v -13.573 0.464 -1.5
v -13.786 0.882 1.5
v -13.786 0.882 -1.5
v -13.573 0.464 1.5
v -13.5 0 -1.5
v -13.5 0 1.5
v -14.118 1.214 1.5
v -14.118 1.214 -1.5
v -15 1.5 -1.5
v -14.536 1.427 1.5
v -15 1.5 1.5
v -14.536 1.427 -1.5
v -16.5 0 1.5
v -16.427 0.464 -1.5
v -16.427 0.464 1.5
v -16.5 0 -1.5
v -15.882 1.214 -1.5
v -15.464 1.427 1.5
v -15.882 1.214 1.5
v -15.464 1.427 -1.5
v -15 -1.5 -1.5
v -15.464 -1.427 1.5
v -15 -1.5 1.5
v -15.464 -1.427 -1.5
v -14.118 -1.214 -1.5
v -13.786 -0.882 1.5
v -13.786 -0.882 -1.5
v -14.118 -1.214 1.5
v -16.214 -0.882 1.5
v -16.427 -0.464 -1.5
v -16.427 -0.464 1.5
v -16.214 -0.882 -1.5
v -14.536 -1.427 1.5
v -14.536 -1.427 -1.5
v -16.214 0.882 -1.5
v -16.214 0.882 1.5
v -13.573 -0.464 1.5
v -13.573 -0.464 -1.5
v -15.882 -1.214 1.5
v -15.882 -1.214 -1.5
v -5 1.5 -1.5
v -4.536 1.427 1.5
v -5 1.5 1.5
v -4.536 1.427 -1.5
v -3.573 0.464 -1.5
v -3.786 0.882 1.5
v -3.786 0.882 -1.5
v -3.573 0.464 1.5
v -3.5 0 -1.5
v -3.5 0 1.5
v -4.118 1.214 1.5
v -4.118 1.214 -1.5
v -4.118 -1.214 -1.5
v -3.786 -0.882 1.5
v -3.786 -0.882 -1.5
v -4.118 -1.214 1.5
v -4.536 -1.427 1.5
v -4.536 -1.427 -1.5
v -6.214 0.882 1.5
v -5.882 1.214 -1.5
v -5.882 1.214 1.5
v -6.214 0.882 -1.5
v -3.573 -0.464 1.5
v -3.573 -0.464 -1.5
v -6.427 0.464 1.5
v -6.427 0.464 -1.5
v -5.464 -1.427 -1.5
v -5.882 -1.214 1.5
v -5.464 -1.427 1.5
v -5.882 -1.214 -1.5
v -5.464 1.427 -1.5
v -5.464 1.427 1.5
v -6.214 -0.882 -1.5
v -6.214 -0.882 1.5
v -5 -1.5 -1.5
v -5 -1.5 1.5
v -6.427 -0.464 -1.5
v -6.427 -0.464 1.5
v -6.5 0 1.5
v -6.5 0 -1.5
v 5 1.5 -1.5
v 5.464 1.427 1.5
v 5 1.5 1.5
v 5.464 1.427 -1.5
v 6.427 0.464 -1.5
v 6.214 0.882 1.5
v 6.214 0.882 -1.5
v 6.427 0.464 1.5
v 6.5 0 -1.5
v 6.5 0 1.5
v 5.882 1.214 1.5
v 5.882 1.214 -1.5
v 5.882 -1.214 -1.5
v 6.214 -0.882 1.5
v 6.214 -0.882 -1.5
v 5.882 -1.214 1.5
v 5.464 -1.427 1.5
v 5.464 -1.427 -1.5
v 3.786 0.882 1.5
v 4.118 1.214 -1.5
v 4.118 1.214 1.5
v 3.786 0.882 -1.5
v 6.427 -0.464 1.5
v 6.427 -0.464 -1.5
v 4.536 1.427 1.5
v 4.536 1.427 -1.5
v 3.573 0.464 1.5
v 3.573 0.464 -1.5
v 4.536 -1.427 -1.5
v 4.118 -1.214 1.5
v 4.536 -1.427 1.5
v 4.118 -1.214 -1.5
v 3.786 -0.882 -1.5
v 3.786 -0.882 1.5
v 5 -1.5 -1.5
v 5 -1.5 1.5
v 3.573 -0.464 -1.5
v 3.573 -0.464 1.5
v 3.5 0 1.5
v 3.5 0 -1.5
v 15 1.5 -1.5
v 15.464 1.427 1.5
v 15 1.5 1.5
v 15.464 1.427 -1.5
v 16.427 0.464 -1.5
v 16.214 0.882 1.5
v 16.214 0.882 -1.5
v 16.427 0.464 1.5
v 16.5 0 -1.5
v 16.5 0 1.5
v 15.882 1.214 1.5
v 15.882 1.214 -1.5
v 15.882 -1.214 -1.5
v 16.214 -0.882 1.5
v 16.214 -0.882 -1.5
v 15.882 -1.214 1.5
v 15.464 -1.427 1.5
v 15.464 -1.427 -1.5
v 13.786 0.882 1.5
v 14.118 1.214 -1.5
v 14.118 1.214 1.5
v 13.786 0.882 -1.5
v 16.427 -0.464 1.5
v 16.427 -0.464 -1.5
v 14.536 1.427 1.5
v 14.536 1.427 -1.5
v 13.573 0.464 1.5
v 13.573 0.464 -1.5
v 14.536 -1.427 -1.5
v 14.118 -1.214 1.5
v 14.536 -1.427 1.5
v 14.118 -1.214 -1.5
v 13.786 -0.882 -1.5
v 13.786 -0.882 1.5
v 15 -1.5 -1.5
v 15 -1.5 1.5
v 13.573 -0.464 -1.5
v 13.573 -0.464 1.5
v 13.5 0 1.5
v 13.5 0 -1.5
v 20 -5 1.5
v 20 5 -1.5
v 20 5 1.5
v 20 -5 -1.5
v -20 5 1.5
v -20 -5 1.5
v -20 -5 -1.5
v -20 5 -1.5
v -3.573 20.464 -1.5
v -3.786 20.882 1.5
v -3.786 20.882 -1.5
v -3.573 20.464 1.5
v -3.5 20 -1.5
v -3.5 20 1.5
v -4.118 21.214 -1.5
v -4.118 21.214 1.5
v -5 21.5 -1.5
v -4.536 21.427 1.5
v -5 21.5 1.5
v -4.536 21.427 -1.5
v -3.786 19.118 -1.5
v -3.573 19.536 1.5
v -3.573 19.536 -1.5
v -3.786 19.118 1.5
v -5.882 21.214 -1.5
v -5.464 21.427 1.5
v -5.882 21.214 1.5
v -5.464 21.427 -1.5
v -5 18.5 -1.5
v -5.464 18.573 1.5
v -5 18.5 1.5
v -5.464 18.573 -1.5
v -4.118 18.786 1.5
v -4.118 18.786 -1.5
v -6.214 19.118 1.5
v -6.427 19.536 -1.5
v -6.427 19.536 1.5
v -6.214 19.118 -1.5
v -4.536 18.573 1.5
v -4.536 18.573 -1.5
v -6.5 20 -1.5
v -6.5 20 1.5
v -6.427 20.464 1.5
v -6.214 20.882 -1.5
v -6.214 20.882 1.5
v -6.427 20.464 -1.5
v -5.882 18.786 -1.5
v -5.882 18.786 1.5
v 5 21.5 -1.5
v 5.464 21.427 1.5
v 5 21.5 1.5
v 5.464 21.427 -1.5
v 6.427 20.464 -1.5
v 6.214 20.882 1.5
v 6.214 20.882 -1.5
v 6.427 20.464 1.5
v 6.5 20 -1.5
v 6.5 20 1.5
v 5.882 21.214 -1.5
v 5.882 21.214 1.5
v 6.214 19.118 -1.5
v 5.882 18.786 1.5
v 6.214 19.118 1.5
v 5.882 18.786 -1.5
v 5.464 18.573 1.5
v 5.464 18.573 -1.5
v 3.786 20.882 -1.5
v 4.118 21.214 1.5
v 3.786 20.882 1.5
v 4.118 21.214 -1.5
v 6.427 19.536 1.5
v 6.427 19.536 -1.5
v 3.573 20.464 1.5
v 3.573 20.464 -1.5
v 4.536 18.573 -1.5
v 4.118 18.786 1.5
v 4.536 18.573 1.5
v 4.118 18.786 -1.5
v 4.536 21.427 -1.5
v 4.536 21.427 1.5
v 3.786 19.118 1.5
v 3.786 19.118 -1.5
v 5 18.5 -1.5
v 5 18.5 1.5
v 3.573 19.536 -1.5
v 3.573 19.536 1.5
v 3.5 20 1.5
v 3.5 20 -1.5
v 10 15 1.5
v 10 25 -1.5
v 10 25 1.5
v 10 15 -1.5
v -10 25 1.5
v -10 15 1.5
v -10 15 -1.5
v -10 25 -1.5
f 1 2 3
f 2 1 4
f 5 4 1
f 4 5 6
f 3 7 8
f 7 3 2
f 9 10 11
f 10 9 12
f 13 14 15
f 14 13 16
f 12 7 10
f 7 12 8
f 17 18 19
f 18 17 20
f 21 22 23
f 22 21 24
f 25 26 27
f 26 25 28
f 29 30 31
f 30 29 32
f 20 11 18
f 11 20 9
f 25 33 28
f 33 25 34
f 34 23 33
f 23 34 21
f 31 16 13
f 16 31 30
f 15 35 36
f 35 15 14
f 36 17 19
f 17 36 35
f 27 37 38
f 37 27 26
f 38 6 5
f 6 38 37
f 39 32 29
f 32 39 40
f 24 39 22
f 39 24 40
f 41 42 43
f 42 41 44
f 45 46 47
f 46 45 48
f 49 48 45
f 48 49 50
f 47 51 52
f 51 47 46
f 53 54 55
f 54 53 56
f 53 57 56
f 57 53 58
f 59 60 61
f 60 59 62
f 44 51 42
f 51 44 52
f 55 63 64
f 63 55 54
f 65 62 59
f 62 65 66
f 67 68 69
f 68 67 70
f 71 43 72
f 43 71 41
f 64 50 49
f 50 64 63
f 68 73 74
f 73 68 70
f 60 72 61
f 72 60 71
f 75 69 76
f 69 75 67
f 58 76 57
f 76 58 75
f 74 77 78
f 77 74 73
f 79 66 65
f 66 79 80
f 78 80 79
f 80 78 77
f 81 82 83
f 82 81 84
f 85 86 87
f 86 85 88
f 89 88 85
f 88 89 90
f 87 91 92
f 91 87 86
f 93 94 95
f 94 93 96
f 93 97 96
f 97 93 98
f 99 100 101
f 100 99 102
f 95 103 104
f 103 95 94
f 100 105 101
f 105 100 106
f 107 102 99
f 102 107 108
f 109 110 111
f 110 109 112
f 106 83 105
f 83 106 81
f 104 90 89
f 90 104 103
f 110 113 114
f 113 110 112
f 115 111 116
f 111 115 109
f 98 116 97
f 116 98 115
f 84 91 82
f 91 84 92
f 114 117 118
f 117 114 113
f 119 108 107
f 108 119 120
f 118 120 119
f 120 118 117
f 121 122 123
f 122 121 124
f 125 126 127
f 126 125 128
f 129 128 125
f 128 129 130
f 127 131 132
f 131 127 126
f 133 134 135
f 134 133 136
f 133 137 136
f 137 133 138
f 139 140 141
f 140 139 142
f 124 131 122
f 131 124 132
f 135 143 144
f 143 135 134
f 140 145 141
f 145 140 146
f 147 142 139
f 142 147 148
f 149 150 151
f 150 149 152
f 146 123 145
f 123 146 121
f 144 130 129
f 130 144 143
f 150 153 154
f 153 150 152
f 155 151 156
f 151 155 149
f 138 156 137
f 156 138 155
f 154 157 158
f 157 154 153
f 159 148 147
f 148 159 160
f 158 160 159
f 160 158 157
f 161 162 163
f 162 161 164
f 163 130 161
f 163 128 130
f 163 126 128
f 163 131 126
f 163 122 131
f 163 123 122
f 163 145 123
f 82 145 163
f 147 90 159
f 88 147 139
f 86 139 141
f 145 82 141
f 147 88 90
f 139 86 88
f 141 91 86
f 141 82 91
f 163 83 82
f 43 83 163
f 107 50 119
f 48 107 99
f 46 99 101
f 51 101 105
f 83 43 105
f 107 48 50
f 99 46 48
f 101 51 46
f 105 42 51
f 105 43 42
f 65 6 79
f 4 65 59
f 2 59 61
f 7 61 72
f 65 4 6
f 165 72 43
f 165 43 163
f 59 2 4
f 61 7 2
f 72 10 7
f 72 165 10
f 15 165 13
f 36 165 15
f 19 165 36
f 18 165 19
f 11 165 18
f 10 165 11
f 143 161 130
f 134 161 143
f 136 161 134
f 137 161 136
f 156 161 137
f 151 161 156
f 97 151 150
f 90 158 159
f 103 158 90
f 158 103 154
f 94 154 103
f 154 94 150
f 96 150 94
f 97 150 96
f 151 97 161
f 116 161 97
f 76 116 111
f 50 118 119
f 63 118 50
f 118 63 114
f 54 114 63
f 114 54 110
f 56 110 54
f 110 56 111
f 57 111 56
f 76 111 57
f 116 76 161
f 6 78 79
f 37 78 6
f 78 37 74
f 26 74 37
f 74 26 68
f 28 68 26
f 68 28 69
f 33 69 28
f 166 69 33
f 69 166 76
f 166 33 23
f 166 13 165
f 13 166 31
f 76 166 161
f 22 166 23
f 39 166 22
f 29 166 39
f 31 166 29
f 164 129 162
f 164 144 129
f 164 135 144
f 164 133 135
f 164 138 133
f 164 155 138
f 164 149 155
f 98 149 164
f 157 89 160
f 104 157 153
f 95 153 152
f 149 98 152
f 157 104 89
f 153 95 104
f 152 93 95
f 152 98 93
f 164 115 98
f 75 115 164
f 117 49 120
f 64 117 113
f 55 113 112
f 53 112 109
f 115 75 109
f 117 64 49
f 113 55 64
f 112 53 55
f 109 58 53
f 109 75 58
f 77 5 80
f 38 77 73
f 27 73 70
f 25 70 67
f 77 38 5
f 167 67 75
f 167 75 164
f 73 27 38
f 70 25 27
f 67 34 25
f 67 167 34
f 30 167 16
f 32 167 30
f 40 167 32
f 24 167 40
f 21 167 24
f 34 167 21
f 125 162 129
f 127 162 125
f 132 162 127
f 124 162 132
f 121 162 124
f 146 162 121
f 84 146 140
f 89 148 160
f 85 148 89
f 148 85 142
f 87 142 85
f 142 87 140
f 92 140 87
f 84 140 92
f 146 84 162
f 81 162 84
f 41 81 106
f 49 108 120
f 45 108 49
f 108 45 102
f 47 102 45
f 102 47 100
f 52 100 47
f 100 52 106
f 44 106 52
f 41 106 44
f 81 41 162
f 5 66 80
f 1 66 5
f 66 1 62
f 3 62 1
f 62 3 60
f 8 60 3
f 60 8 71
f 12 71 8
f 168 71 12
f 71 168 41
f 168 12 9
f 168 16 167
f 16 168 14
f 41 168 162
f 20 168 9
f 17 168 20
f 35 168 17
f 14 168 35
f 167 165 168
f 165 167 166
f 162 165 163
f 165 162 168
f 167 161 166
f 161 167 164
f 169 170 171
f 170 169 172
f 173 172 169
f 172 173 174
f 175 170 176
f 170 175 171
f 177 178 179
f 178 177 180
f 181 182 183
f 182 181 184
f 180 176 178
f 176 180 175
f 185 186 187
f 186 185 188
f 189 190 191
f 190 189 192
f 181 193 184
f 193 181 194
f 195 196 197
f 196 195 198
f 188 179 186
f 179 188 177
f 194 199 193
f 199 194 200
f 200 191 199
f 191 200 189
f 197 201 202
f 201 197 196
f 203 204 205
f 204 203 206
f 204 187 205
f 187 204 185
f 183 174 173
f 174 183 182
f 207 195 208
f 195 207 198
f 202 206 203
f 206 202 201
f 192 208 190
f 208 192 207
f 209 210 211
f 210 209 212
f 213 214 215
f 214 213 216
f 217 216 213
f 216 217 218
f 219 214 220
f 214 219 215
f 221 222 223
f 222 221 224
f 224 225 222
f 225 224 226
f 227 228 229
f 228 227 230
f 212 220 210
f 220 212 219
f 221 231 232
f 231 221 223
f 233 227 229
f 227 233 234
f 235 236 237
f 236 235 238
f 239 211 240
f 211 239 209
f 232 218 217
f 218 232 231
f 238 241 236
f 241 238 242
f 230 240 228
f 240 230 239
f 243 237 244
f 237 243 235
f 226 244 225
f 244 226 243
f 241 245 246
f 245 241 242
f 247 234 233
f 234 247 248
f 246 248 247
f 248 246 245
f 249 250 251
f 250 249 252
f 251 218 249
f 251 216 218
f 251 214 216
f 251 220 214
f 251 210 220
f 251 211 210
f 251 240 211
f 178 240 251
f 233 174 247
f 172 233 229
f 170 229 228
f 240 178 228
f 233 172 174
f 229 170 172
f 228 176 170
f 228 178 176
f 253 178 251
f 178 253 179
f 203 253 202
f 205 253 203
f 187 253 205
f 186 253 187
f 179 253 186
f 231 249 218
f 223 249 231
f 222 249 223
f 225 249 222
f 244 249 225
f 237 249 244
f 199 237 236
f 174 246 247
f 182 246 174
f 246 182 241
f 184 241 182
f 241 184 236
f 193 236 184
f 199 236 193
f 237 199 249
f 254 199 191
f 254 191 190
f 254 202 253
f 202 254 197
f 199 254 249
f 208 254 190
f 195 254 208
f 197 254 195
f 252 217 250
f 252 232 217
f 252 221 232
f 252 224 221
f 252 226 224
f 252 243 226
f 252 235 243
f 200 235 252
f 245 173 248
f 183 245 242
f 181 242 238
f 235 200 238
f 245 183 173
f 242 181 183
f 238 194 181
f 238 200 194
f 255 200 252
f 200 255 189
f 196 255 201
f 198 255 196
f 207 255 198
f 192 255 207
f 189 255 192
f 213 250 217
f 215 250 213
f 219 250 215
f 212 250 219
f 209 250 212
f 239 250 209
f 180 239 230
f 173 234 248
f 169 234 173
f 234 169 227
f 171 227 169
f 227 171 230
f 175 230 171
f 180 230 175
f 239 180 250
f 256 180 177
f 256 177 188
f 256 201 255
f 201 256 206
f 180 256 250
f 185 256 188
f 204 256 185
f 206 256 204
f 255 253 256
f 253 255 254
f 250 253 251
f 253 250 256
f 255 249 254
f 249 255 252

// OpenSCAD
// file: utils/build_plate.scad
// Build Plate representation module
// Made by Makerbot (http://curriculum.makerbot.com/daily_lessons/february/openscad_buildplate.html)

//use this to include a build plate visualization in your openSCAD scripts. Very useful for things designed to be edited in Makerbot Customizer

//to use, either include or use <utils/build_plate.scad>

//then just call build_plate(); with the following arguments (also, you have to have a real object in your scene for this to render)

//putting 0 as the first argument will give you a Replicator 2 build plate
//putting 1 as the first argument will give you a Replicator 1 build plate
//putting 2 as the first argument will give you a Thingomatic build plate
//putting 3 as the first argument will give you a manually adjustable build plate (note: if you use this option, you need to specify your build plates X length (in mm) as the second argument and the Y length (in mm) as the third argument. eg. build_plate(3,150,120);)

/*

to give your user control of which build plate they see in Customizer, include the following code:

use <utils/build_plate.scad>

//for display only, doesn't contribute to final object
build_plate_selector = 0; //[0:Replicator 2,1: Replicator,2:Thingomatic,3:Manual]
//when Build Plate Selector is set to "manual" this controls the build plate x dimension
build_plate_manual_x = 100; //[100:400]
//when Build Plate Selector is set to "manual" this controls the build plate y dimension
build_plate_manual_y = 100; //[100:400]

build_plate(build_plate_selector,build_plate_manual_x,build_plate_manual_y);

*/




//to see how this works, uncomment the following code

//build_plate_selector = 0; //[0:Replicator 2,1: Replicator,2:Thingomatic,3:Manual]
//build_plate_manual_x = 100; //[100:400]
//build_plate_manual_y = 100; //[100:400]
//
//build_plate(build_plate_selector,build_plate_manual_x,build_plate_manual_y);
//
//cube(5);


module build_plate(bp,manX,manY){

		translate([0,0,-.52]){
			if(bp == 0){
				%cube([285,153,1],center = true);
			}
			if(bp == 1){
				%cube([225,145,1],center = true);
			}
			if(bp == 2){
				%cube([120,120,1],center = true);
			}
			if(bp == 3){
				%cube([manX,manY,1],center = true);
			}
		
		}
		translate([0,0,-.5]){
			if(bp == 0){
				for(i = [-14:14]){
					translate([i*10,0,0])
					%cube([.5,153,1.01],center = true);
				}
				for(i = [-7:7]){
					translate([0,i*10,0])
					%cube([285,.5,1.01],center = true);
				}	
			}
			if(bp == 1){
				for(i = [-11:11]){
					translate([i*10,0,0])
						%cube([.5,145,1.01],center = true);
				}
				for(i = [-7:7]){
					translate([0,i*10,0])
						%cube([225,.5,1.01],center = true);
				}
			}
			if(bp == 2){
				for(i = [-6:6]){
					translate([i*10,0,0])
						%cube([.5,120,1.01],center = true);
				}
				for(i = [-6:6]){
					translate([0,i*10,0])
						%cube([120,.5,1.01],center = true);
				}
			}
			if(bp == 3){
				for(i = [-(floor(manX/20)):floor(manX/20)]){
					translate([i*10,0,0])
						%cube([.5,manY,1.01],center = true);
				}
				for(i = [-(floor(manY/20)):floor(manY/20)]){
					translate([0,i*10,0])
						%cube([manX,.5,1.01],center = true);
				}
			}
		}
}
// main file
use <./utils/build_plate.scad> // Cuadricula transparente para la base
build_plate(3, 200,100); // No se incluye al renderizar


module pieza_mecano(drill=3, d=10, n=4, anchura=10, grosor=3)
{

  //-- Calcular la longitud de la pieza
  lx = n*d;

  //-- Construimos la pieza
  difference() {
    //-- Cuerpo de la pieza
    cube([lx,anchura,grosor],center=true);

    //-- Taladros
    translate([-lx/2+d/2,0,0])
      for (i=[0:n-1]) {
        translate([i*d,0,0])
          cylinder(r=drill/2, h=grosor+5, $fn=20,center=true);
    }
  }
}

//-- Ejemplos de utilizacion
pieza_mecano();


translate([0,20,0])
  pieza_mecano(n=2);
